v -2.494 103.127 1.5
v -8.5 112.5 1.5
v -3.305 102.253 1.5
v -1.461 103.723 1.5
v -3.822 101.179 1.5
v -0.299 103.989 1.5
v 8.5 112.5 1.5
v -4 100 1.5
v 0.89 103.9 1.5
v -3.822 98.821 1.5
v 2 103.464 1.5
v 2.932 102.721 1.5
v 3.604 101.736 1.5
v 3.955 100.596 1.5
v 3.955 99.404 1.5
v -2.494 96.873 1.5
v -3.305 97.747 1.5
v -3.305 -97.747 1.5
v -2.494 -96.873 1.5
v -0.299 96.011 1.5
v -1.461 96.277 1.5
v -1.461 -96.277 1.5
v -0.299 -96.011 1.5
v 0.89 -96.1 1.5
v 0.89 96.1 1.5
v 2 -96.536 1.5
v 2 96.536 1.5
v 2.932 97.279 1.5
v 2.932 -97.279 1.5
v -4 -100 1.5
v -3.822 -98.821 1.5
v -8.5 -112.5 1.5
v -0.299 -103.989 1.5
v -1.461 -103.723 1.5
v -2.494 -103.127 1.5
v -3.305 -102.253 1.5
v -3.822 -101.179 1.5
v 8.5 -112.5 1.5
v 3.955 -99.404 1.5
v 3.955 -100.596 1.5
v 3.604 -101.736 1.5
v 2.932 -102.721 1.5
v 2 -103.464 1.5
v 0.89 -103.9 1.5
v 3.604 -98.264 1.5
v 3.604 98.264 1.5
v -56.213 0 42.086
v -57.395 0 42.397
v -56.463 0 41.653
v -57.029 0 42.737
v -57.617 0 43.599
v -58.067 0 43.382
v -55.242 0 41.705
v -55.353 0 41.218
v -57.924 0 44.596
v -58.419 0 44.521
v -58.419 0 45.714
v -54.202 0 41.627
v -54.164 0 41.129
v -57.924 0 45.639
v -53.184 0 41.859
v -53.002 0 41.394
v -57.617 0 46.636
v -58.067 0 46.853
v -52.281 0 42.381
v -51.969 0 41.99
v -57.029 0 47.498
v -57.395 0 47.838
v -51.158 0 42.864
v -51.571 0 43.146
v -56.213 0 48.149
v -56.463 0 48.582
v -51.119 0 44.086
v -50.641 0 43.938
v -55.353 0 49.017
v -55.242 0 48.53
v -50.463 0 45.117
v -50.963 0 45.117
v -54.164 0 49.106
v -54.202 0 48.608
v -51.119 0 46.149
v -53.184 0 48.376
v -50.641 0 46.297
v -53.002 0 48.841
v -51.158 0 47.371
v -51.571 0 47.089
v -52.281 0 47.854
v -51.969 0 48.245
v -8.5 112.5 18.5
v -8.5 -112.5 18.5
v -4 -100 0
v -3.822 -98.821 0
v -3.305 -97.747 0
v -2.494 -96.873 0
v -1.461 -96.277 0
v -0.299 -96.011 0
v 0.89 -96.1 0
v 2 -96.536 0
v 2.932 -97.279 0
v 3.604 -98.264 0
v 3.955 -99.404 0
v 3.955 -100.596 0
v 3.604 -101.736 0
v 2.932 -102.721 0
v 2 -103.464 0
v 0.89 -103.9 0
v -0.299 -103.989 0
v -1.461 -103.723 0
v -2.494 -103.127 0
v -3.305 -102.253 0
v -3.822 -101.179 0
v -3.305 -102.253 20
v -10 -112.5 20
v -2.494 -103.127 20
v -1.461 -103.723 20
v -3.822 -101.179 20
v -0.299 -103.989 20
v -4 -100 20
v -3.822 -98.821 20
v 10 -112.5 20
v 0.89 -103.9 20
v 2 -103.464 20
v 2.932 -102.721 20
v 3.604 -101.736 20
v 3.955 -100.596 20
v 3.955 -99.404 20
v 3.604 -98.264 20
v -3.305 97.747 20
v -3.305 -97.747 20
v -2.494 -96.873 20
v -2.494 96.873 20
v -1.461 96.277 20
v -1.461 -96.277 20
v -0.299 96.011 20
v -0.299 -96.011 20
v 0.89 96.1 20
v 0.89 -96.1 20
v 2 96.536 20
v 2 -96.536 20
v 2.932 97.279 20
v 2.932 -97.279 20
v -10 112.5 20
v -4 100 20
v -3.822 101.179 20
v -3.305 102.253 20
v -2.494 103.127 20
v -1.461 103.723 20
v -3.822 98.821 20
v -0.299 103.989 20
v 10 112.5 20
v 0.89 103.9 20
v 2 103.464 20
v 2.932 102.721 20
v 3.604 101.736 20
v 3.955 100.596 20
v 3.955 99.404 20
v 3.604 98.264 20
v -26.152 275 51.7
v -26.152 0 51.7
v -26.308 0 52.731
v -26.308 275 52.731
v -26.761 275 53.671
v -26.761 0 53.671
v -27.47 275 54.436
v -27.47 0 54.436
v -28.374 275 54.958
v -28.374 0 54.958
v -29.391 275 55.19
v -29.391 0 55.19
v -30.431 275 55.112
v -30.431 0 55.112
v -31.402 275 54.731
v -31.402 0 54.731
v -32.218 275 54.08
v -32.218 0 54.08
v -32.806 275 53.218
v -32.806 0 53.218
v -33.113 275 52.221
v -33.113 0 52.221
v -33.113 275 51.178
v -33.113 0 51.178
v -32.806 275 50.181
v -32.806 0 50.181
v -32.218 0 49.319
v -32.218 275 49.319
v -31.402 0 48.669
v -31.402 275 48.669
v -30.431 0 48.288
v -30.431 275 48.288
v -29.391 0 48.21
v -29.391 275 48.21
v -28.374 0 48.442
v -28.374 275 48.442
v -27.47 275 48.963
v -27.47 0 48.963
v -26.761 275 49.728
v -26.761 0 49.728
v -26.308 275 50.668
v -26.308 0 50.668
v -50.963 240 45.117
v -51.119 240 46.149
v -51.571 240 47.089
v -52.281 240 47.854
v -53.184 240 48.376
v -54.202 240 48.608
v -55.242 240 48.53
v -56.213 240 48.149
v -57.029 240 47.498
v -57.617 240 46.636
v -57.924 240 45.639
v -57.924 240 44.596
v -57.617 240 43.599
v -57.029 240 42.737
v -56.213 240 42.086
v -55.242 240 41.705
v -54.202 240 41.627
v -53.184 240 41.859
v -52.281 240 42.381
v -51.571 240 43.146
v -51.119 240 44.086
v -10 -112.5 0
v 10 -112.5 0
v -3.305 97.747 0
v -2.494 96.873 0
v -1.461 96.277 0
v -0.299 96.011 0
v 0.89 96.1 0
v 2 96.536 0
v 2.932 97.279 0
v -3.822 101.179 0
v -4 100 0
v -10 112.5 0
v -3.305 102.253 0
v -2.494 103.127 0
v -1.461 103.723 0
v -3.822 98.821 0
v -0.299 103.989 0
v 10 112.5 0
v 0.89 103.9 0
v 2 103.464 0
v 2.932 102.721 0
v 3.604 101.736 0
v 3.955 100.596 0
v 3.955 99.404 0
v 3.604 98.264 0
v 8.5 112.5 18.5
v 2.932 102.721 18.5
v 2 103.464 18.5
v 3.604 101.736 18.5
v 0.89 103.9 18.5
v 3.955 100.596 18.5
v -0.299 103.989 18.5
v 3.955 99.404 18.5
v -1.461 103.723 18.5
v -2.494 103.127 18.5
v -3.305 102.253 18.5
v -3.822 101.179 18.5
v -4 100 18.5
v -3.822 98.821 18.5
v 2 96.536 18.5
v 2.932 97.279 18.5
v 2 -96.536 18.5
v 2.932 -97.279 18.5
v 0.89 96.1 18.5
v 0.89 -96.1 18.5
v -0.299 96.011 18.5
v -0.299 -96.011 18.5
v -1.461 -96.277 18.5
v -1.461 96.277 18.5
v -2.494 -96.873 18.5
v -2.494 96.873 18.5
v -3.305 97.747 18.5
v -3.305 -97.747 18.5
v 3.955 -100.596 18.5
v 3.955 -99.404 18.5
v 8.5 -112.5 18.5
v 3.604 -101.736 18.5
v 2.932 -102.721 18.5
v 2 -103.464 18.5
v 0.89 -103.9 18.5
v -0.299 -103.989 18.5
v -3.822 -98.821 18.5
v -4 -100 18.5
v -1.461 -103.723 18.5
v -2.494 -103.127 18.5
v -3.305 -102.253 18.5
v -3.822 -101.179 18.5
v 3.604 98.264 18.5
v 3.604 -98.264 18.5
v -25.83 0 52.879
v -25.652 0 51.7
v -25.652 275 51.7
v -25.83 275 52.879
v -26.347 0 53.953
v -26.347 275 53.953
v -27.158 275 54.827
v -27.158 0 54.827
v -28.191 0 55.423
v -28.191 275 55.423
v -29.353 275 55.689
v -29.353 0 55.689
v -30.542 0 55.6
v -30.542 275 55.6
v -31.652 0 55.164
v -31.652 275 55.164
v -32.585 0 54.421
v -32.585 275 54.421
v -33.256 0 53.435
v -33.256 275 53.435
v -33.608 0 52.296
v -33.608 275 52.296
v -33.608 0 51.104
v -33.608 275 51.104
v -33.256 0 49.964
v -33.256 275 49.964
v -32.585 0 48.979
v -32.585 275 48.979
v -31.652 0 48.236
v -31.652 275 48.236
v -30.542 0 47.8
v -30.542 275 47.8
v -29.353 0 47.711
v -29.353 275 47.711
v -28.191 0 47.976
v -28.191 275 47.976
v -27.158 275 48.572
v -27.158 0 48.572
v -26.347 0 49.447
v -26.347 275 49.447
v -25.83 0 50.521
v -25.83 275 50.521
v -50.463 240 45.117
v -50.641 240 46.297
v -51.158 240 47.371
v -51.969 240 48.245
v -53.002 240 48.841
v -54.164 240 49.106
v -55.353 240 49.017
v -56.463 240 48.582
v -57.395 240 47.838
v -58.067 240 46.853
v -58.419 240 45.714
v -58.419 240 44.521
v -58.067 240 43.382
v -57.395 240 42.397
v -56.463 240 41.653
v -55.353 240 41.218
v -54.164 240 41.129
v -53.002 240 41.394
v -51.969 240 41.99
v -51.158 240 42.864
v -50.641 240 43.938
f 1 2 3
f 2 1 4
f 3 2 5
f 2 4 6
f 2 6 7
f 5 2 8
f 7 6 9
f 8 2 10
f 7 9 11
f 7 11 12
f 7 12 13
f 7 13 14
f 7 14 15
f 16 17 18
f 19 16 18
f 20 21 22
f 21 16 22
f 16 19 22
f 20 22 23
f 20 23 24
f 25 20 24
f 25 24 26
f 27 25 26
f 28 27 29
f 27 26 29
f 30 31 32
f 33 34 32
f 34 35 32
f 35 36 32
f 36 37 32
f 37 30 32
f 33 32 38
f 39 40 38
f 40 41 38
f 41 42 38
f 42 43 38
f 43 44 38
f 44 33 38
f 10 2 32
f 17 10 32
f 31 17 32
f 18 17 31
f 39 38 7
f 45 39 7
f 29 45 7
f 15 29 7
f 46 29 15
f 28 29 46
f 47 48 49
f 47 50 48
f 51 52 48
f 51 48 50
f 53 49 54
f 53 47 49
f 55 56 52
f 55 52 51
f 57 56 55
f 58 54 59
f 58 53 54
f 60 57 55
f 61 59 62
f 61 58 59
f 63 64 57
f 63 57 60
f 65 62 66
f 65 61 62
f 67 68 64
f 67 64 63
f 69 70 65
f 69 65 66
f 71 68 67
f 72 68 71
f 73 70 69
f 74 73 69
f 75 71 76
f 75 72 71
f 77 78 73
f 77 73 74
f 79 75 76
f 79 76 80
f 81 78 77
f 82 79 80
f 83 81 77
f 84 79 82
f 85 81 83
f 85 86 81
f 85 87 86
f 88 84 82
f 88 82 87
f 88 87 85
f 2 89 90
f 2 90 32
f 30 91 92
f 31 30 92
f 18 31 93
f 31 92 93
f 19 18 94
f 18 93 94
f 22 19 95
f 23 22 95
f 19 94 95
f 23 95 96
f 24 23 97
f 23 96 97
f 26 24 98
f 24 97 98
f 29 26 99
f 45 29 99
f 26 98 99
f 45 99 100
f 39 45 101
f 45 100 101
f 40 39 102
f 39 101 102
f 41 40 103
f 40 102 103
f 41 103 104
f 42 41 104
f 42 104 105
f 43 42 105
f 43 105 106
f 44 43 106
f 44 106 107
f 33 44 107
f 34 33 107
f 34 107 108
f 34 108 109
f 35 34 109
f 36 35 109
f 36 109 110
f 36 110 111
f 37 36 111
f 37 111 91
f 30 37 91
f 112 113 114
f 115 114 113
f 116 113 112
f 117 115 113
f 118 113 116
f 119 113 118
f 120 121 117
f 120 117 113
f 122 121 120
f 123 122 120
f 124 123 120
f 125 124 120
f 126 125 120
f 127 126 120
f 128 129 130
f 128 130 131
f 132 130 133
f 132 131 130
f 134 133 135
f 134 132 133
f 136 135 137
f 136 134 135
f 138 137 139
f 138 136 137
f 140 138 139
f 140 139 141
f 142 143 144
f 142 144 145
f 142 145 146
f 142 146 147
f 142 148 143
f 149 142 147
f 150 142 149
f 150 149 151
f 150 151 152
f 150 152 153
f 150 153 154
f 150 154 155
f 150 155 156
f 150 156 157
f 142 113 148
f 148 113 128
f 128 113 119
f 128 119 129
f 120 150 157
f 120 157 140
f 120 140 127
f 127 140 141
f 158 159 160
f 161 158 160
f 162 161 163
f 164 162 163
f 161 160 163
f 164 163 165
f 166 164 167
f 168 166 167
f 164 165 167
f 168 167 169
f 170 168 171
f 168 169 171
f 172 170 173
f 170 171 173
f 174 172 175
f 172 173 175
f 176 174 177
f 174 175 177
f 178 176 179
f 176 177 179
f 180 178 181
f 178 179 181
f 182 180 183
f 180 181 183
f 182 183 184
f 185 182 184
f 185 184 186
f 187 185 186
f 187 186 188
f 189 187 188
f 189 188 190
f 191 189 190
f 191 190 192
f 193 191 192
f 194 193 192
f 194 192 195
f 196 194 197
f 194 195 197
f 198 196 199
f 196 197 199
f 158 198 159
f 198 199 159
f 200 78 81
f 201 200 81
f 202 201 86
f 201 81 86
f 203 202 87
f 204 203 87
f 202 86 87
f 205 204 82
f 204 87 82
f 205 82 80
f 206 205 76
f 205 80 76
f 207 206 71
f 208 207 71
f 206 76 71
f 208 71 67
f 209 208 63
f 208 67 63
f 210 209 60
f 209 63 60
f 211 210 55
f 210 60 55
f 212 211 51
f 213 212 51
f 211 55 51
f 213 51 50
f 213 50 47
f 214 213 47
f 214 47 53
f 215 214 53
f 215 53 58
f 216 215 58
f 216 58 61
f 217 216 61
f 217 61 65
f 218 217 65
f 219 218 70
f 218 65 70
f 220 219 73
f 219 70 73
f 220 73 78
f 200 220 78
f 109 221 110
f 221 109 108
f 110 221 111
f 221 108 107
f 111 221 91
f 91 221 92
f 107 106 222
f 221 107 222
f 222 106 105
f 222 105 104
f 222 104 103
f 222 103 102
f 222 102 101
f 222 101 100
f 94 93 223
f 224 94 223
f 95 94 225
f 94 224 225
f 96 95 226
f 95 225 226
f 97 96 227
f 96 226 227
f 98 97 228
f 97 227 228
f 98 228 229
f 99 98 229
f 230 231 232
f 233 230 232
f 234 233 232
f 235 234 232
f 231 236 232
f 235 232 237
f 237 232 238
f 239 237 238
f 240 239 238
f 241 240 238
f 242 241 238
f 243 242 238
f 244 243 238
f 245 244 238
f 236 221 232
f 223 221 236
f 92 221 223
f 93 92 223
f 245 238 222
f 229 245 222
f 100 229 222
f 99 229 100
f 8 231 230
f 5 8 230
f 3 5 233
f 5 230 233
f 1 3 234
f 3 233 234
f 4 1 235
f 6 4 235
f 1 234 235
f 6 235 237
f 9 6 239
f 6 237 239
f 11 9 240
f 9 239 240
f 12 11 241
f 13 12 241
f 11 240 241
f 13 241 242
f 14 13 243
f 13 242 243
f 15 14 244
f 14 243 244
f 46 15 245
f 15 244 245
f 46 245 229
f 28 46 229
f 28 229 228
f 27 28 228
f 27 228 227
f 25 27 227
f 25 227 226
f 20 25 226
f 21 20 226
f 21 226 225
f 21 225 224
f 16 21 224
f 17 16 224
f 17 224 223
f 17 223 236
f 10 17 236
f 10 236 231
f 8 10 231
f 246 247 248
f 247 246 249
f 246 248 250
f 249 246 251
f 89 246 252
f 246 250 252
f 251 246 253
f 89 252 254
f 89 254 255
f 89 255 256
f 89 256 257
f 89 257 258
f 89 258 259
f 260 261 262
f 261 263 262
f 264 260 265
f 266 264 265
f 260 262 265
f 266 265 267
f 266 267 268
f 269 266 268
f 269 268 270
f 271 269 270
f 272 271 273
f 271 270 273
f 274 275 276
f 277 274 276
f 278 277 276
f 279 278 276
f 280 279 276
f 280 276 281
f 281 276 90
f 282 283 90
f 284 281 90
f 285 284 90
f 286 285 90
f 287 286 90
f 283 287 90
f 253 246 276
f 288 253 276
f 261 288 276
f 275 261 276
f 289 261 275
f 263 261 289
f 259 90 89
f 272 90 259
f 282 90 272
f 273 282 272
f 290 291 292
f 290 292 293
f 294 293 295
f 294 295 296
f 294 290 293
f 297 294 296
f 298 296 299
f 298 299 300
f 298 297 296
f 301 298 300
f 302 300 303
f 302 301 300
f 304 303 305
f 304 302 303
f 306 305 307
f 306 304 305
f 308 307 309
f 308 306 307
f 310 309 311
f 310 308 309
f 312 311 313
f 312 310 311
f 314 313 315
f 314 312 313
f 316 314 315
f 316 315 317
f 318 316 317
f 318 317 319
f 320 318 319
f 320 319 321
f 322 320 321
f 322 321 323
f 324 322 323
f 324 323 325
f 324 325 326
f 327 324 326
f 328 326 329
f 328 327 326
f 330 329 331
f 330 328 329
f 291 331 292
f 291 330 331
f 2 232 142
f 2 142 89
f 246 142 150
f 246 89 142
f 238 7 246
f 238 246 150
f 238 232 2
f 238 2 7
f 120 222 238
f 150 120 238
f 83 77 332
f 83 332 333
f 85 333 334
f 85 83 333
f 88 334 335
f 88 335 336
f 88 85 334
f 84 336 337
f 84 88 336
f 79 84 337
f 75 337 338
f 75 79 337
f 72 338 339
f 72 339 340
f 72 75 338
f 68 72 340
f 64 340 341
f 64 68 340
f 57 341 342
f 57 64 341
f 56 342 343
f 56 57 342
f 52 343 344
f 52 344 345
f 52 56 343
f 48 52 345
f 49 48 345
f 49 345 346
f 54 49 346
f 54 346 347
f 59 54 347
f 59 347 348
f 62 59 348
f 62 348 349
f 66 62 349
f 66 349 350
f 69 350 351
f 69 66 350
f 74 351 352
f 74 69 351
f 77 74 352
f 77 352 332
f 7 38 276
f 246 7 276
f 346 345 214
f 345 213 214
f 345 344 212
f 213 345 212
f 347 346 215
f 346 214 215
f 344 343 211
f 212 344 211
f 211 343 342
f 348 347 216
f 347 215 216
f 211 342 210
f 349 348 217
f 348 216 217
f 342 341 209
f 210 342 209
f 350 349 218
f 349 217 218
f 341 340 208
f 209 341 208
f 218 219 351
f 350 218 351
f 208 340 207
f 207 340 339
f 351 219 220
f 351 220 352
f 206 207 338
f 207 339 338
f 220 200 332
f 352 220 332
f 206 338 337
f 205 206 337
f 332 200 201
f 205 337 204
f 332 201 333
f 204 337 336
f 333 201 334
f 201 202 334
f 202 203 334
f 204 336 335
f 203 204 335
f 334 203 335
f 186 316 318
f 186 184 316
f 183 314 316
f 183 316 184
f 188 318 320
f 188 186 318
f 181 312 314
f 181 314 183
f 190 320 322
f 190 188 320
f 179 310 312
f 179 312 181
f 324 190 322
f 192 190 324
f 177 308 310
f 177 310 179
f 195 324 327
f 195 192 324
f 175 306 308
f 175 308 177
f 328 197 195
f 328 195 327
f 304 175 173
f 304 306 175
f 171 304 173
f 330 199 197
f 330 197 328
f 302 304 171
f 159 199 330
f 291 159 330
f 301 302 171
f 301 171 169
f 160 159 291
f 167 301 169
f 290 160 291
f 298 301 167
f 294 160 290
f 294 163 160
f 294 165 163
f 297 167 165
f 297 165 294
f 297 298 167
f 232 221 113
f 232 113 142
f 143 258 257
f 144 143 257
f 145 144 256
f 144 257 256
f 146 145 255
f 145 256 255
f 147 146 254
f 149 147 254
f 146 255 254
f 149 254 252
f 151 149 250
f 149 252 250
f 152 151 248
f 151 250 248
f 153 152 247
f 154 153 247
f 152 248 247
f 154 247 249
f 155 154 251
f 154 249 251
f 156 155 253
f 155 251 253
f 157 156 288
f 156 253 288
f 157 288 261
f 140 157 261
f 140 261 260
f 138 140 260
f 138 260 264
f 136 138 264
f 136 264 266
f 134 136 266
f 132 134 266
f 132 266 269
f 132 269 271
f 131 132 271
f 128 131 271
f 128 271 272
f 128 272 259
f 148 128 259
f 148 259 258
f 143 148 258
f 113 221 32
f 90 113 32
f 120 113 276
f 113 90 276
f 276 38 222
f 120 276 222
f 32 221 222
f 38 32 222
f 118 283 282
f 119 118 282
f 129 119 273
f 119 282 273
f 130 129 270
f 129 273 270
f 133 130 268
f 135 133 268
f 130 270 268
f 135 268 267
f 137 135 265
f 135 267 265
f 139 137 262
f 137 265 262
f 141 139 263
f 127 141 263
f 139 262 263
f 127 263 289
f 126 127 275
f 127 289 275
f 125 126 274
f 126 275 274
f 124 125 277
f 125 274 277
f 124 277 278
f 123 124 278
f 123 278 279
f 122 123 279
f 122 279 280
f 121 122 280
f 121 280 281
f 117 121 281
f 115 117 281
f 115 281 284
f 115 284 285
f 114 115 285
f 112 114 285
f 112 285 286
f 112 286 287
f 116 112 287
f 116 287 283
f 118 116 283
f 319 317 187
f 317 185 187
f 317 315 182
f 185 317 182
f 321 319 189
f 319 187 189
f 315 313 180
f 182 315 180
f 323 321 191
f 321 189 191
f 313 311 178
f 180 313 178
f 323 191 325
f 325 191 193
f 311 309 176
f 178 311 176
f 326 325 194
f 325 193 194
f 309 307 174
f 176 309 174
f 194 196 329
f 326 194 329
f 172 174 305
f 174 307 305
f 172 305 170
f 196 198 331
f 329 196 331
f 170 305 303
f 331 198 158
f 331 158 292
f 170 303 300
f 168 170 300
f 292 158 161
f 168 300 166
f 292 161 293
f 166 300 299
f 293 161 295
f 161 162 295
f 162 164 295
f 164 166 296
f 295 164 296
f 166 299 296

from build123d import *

# Parameters (mm, degrees)
F0_W     = 20
F0_H     = 225
F1_DEPTH = 20
F3_DEPTH = 225
F5_D     = 8
F5_DEPTH = 450
F6_R     = 4
F6_R_2   = 3.5
F7_DEPTH = 240
F8_R     = 4
F8_R_2   = 3.5
F9_DEPTH = 275


with BuildPart() as f1:
    # F0 (on Top) → F1 (new body)
    with BuildSketch(Plane.XY):
        Rectangle(F0_W, F0_H)
    extrude(amount=F1_DEPTH)

    # F2 (on face) → F3 (cut)
    with BuildSketch(Plane.XZ.offset(112.5)):
        Polygon((8.5, 1.5), (8.5, 18.5), (-8.5, 1.5), align=None)
        Polygon((-8.5, 1.5), (8.5, 18.5), (-8.5, 18.5), align=None)
    extrude(amount=-F3_DEPTH, mode=Mode.SUBTRACT)

    # F5
    with Locations(Plane.XY.offset(20)):
        with Locations((0, -100), (0, 100)):
            Hole(F5_D / 2, depth=F5_DEPTH)


with BuildPart() as f7:
    # F6 (on Front) → F7 (new body)
    with BuildSketch(Plane.XZ):
        with Locations((-54.463178, 45.117497)):
            Circle(F6_R)
        with Locations((-54.463178, 45.117497)):
            Circle(F6_R_2, mode=Mode.SUBTRACT)
    extrude(amount=-F7_DEPTH)


with BuildPart() as f9:
    # F8 (on Front) → F9 (new body)
    with BuildSketch(Plane.XZ):
        with Locations((-29.652413, 51.69981)):
            Circle(F8_R)
        with Locations((-29.652413, 51.69981)):
            Circle(F8_R_2, mode=Mode.SUBTRACT)
    extrude(amount=-F9_DEPTH)


solid = Compound([f1.part, f7.part, f9.part])
